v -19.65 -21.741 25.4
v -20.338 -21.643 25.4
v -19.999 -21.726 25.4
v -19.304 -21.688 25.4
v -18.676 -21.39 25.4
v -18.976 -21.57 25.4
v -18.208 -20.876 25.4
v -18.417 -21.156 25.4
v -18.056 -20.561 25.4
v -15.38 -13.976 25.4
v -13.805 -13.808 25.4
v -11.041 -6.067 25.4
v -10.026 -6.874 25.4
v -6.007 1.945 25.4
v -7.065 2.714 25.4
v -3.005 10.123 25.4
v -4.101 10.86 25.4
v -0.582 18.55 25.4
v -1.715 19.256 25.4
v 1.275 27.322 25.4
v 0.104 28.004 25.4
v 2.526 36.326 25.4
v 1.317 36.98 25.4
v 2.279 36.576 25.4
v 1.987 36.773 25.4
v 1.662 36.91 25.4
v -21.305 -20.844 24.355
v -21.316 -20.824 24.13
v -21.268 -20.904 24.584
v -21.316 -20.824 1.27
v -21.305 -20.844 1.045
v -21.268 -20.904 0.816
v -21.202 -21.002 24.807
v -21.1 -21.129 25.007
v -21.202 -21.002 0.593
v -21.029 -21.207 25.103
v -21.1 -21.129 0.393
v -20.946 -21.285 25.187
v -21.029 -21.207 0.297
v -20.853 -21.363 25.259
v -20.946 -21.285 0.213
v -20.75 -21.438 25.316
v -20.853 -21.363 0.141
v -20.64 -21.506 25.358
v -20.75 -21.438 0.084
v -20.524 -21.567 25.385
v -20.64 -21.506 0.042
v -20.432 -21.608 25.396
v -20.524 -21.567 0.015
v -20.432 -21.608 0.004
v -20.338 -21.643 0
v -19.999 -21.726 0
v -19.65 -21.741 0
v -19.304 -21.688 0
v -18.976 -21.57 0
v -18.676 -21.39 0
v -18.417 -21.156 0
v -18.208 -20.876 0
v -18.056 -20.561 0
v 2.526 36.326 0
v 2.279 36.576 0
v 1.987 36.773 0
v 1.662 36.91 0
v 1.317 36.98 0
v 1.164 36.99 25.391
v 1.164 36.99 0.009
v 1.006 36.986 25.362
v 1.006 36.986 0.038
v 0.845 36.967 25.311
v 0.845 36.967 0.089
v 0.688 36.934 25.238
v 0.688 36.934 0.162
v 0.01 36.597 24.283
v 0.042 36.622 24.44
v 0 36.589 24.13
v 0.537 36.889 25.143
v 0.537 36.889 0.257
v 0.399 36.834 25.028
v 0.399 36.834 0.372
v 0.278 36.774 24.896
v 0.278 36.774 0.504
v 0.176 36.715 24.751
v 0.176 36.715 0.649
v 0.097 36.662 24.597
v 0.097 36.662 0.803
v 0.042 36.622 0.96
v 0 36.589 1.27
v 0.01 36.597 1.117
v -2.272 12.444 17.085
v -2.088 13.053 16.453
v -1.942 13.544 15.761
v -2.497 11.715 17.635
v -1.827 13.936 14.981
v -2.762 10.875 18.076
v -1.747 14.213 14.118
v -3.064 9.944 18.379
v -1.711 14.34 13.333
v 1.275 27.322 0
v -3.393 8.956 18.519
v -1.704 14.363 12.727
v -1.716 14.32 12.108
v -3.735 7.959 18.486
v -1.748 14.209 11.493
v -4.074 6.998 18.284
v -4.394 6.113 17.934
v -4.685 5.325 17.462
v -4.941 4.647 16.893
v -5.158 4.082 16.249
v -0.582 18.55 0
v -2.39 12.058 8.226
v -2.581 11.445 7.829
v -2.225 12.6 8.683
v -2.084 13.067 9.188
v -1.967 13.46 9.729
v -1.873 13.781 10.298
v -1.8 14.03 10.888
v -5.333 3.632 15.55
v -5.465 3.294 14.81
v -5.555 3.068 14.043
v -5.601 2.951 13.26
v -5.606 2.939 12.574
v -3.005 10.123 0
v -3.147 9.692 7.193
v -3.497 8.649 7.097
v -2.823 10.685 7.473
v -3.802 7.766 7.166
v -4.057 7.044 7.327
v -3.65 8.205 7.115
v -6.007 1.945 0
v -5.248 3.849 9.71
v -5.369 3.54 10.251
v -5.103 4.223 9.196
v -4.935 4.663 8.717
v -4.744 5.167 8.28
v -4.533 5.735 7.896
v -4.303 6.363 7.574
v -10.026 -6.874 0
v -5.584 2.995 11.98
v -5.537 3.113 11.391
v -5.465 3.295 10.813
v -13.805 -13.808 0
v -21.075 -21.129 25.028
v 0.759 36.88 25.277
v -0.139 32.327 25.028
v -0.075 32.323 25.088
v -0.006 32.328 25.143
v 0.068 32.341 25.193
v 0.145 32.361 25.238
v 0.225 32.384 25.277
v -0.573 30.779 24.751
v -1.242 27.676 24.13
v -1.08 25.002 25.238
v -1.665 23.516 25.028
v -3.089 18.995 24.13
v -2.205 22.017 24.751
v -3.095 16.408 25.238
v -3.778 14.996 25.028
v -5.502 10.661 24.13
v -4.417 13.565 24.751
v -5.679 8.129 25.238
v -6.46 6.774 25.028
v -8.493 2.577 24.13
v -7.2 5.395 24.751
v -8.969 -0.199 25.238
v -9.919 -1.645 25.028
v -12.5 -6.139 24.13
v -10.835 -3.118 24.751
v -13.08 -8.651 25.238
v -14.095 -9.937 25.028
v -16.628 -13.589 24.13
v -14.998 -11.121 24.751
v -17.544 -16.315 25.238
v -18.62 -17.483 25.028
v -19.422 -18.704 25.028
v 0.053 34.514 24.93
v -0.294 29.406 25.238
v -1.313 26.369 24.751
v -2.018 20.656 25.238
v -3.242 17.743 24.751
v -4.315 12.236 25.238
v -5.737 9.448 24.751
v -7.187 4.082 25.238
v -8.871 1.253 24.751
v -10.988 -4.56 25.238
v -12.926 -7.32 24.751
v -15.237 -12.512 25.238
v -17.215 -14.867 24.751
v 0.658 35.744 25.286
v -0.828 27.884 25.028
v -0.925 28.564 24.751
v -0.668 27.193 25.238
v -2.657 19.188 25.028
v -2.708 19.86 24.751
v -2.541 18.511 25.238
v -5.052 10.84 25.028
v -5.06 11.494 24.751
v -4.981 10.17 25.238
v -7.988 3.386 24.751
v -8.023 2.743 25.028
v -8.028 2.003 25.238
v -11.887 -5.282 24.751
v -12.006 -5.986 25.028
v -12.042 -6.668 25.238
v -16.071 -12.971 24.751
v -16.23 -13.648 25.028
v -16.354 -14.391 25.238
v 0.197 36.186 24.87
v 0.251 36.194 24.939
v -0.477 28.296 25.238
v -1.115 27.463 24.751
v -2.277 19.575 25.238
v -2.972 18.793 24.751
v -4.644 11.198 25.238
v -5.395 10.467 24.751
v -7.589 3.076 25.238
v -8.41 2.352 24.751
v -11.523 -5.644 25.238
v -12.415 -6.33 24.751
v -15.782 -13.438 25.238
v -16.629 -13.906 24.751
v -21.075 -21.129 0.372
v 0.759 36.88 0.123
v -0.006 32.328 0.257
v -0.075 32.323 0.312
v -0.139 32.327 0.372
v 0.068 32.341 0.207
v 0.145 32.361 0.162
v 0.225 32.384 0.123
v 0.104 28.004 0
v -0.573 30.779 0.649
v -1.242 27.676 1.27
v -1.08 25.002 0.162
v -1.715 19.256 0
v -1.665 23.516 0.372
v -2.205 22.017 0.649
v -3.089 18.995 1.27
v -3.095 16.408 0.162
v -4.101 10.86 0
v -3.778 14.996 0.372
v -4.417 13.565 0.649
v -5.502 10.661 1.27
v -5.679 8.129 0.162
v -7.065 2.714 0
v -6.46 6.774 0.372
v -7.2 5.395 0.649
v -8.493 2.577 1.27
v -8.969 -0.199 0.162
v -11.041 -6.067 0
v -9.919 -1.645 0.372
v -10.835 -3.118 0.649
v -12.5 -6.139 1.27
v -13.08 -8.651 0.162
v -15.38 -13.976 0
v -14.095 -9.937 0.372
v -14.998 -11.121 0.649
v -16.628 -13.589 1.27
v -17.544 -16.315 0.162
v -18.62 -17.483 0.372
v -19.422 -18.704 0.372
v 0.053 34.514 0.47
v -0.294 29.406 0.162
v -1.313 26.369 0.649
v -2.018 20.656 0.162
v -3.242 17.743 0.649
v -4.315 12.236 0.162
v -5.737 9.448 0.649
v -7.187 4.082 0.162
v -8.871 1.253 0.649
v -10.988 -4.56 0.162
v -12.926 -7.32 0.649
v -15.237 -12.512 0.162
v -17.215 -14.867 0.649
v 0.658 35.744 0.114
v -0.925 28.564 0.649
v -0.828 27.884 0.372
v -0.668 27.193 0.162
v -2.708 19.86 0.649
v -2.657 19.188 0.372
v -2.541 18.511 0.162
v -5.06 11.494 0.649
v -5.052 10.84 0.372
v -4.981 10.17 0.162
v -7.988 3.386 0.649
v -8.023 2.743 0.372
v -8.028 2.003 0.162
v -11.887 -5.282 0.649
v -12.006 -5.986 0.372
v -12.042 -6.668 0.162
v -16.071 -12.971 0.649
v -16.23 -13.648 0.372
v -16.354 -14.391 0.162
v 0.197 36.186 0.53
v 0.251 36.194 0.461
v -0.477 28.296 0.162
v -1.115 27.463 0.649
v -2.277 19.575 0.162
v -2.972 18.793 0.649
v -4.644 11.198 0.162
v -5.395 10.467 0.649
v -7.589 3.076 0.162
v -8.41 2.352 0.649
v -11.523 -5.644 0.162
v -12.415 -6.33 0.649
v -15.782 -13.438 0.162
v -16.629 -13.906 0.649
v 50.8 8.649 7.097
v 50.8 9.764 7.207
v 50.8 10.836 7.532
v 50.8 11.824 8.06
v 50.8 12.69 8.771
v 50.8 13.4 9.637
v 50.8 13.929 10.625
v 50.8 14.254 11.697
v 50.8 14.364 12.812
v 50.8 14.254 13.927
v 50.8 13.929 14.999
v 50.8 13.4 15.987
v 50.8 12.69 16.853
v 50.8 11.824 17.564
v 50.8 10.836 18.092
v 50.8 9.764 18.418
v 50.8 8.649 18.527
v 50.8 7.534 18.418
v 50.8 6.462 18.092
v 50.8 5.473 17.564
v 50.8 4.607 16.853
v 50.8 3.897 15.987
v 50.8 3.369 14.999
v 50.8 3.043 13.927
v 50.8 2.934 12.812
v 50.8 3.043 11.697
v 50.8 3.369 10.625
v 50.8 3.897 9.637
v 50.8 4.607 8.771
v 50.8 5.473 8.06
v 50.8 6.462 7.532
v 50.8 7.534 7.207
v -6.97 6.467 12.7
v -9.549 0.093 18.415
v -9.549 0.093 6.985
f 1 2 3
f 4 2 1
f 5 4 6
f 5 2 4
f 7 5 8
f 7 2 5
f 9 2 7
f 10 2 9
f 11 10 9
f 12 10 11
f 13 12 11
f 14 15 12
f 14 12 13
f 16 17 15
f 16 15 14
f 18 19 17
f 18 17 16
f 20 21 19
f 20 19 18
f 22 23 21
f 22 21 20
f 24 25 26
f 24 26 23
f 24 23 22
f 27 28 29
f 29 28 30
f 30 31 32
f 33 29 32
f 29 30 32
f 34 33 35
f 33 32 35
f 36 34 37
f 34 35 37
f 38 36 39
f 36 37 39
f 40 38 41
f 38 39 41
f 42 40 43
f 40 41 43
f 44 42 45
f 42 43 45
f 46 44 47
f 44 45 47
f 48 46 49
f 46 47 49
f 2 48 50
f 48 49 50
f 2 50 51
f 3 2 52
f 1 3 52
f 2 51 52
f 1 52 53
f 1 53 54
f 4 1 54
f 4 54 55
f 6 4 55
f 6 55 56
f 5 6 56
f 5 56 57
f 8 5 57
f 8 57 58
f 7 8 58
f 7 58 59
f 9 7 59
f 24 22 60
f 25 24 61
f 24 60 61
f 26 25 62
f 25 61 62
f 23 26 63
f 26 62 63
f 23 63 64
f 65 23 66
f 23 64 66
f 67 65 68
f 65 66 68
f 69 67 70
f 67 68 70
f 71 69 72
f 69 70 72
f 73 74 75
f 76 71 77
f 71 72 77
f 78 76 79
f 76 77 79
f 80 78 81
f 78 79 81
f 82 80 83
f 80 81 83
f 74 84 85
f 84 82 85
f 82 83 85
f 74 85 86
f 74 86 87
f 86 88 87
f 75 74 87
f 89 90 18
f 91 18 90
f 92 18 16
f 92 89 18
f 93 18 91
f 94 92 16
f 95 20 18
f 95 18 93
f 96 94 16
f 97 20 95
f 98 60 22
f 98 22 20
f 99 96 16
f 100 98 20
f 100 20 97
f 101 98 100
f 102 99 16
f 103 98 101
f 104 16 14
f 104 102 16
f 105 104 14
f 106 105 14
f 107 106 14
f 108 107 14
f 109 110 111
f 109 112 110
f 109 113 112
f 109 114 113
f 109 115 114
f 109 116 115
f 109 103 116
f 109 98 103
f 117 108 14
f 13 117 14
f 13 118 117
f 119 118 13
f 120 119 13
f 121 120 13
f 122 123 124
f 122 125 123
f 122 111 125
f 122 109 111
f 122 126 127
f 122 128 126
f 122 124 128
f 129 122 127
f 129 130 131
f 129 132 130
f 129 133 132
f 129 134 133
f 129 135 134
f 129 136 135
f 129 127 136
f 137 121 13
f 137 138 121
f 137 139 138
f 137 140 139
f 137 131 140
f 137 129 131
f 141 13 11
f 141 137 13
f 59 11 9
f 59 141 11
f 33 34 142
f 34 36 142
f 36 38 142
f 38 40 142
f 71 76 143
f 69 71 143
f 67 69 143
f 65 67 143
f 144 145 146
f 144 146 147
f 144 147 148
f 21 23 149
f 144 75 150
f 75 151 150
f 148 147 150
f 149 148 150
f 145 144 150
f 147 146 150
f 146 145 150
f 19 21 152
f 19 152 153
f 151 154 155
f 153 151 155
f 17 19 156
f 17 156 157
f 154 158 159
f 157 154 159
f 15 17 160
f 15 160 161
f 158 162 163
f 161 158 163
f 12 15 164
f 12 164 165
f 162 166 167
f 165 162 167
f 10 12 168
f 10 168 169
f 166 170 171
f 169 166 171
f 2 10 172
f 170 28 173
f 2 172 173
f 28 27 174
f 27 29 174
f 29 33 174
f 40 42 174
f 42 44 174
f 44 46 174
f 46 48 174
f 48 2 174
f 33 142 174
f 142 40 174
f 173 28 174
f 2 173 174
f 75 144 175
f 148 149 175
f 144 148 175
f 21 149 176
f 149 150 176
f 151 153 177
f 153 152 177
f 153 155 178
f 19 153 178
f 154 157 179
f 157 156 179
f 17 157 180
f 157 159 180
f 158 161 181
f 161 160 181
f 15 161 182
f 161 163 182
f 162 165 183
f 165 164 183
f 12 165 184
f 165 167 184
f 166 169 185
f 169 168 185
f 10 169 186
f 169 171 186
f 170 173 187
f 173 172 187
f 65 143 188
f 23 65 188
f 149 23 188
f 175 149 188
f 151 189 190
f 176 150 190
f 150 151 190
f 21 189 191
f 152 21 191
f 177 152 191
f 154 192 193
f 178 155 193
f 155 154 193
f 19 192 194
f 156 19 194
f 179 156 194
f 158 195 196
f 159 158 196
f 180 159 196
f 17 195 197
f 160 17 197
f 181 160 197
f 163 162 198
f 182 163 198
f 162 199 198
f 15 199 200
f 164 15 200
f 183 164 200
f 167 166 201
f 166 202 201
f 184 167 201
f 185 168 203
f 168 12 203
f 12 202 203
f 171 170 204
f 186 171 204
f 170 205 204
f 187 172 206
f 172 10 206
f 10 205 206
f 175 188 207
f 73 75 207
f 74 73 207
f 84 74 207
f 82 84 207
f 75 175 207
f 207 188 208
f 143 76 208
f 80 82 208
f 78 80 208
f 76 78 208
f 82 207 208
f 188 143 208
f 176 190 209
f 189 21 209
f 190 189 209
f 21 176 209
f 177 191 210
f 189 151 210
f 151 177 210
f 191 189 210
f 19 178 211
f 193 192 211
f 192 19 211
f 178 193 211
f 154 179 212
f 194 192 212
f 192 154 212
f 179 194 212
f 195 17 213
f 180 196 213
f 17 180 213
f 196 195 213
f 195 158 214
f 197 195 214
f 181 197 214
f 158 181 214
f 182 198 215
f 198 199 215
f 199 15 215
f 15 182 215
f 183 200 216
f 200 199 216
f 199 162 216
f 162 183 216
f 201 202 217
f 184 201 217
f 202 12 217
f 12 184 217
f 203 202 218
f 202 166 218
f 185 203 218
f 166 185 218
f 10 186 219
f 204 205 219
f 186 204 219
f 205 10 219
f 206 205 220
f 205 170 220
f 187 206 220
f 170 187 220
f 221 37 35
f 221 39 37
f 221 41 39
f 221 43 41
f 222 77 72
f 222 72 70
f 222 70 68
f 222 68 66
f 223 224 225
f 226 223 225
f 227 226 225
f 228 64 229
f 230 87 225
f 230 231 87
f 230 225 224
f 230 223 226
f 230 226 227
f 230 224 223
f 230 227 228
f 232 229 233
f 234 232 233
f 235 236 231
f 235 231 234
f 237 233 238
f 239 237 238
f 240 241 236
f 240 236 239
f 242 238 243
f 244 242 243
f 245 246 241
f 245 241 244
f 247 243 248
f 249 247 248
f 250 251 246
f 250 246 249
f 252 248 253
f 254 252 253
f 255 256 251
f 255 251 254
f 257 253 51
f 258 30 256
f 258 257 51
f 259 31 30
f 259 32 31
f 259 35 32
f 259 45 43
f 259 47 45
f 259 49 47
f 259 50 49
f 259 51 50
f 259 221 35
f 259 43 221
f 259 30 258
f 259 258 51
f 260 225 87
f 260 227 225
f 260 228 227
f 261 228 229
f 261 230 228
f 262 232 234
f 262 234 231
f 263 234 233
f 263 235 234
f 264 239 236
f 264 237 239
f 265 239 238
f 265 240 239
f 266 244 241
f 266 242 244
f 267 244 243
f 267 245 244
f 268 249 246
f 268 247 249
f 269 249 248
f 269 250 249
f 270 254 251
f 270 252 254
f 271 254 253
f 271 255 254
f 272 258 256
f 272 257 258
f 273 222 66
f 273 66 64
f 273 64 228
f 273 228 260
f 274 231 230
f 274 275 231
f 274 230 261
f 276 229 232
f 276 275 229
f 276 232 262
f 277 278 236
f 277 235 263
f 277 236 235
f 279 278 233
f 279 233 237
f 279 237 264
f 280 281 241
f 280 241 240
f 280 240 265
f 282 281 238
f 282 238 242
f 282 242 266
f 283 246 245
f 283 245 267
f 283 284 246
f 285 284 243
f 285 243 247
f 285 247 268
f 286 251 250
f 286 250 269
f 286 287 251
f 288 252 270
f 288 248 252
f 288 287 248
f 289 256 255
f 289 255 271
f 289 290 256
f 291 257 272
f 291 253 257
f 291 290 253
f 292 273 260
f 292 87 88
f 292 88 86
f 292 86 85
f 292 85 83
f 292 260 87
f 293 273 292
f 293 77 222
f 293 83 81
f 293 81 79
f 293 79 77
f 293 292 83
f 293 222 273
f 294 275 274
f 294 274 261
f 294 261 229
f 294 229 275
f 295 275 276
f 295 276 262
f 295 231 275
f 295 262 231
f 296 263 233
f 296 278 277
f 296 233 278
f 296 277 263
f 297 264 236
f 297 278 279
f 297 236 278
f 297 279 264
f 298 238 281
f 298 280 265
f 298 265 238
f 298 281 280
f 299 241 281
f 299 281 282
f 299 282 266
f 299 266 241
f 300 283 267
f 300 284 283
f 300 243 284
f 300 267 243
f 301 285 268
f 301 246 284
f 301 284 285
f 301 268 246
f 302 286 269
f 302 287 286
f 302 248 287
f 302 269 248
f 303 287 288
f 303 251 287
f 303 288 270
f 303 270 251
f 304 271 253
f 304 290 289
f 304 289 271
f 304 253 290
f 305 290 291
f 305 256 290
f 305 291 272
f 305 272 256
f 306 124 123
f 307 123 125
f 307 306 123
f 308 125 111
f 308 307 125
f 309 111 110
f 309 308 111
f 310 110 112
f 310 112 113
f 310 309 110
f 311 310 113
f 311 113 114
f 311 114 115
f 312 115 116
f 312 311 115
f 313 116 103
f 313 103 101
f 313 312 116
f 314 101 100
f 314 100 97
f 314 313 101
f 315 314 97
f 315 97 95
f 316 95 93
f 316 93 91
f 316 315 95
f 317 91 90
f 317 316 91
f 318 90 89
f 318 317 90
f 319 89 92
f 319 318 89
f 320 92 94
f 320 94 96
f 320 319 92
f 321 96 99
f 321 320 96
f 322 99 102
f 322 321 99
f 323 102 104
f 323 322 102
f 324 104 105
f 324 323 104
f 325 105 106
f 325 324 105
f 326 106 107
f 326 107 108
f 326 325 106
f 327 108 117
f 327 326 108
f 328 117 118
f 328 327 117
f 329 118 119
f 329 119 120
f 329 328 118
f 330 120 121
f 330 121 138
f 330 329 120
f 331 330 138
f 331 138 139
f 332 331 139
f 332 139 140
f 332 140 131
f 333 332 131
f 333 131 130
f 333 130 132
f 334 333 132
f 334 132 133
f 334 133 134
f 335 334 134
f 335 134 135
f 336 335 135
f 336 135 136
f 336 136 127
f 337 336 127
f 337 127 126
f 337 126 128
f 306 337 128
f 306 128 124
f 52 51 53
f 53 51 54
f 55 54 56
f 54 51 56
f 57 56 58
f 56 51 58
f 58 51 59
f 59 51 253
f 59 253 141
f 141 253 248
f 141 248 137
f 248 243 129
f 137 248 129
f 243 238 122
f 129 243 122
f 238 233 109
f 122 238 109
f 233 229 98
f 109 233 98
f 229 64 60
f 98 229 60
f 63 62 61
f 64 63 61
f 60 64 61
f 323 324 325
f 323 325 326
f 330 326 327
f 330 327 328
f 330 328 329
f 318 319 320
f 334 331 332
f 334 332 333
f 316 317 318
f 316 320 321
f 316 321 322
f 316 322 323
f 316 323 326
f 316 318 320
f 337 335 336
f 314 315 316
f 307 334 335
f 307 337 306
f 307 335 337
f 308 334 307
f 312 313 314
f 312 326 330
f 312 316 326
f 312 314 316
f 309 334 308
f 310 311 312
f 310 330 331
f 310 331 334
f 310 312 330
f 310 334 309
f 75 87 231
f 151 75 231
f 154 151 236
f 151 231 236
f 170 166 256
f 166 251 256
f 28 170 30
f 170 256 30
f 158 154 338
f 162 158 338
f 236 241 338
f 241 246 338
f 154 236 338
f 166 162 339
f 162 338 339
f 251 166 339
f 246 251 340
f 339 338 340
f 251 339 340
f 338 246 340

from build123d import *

# Parameters (mm, degrees)
BOSS_EXTRUDE1_DEPTH             = 25.4
SKETCH2_R                       = 5.715
BOSS_EXTRUDE2_DEPTH             = 48.26
BOSS_EXTRUDE2_DIRECTION_2_REACH = 52.818
FILLET1_R                       = 1.27


with BuildPart() as part:
    # Sketch1 → Boss-Extrude1 (new body)
    with BuildSketch(Plane.XY):
        with BuildLine():
            ThreePointArc((-21.315601844, -20.824385658), (-19.601712639, -21.737702654), (-18.056418846, -20.5614241))
            add(Edge.make_bspline(
                [(2.526351365, 36.325614342), (-0.715696382, 5.186662468), (-18.056418846, -20.5614241)],
                knots=[0, 0, 0, 0.967613504, 0.967613504, 0.967613504], degree=2))
            ThreePointArc((2.526351365, 36.325614342), (1.317636804, 36.98031962), (0, 36.5885759))
            add(Edge.make_bspline(
                [(0, 36.5885759), (-3.282504286, 5.052562618), (-21.315601844, -20.824385658)],
                knots=[0, 0, 0, 1, 1, 1], degree=2))
        make_face()
    extrude(amount=BOSS_EXTRUDE1_DEPTH)

    # Sketch2 → Boss-Extrude2 (add)
    with BuildSketch(Plane(origin=(2.54, 0, 0), x_dir=(0, 0, -1), z_dir=(1, 0, 0))):
        with Locations((-12.812340203, 8.6485759)):
            Circle(SKETCH2_R)
    extrude(amount=BOSS_EXTRUDE2_DEPTH)

    # Sketch2 → Boss-Extrude2 direction 2 (add, up to next)
    with BuildSketch(Plane(origin=(2.54, 0, 0), x_dir=(0, 0, -1), z_dir=(1, 0, 0)), mode=Mode.PRIVATE) as boss_extrude2_direction_2_sk1:
        with Locations((-12.812340203, 8.6485759)):
            Circle(SKETCH2_R)
    boss_extrude2_direction_2_tool1 = extrude(boss_extrude2_direction_2_sk1.sketch, amount=-BOSS_EXTRUDE2_DIRECTION_2_REACH, mode=Mode.PRIVATE) - part.part
    add(boss_extrude2_direction_2_tool1.solids().sort_by_distance((2.54, 8.648576, 12.81234))[0])

    # Fillet1
    fillet1_edges = [part.edges().sort_by_distance(p)[0] for p in [
        (-6.955501037, 6.506813911, 25.4),
        (-6.955501037, 6.506813911, 0),
    ]]
    fillet(fillet1_edges, radius=FILLET1_R)


solid = part.part
